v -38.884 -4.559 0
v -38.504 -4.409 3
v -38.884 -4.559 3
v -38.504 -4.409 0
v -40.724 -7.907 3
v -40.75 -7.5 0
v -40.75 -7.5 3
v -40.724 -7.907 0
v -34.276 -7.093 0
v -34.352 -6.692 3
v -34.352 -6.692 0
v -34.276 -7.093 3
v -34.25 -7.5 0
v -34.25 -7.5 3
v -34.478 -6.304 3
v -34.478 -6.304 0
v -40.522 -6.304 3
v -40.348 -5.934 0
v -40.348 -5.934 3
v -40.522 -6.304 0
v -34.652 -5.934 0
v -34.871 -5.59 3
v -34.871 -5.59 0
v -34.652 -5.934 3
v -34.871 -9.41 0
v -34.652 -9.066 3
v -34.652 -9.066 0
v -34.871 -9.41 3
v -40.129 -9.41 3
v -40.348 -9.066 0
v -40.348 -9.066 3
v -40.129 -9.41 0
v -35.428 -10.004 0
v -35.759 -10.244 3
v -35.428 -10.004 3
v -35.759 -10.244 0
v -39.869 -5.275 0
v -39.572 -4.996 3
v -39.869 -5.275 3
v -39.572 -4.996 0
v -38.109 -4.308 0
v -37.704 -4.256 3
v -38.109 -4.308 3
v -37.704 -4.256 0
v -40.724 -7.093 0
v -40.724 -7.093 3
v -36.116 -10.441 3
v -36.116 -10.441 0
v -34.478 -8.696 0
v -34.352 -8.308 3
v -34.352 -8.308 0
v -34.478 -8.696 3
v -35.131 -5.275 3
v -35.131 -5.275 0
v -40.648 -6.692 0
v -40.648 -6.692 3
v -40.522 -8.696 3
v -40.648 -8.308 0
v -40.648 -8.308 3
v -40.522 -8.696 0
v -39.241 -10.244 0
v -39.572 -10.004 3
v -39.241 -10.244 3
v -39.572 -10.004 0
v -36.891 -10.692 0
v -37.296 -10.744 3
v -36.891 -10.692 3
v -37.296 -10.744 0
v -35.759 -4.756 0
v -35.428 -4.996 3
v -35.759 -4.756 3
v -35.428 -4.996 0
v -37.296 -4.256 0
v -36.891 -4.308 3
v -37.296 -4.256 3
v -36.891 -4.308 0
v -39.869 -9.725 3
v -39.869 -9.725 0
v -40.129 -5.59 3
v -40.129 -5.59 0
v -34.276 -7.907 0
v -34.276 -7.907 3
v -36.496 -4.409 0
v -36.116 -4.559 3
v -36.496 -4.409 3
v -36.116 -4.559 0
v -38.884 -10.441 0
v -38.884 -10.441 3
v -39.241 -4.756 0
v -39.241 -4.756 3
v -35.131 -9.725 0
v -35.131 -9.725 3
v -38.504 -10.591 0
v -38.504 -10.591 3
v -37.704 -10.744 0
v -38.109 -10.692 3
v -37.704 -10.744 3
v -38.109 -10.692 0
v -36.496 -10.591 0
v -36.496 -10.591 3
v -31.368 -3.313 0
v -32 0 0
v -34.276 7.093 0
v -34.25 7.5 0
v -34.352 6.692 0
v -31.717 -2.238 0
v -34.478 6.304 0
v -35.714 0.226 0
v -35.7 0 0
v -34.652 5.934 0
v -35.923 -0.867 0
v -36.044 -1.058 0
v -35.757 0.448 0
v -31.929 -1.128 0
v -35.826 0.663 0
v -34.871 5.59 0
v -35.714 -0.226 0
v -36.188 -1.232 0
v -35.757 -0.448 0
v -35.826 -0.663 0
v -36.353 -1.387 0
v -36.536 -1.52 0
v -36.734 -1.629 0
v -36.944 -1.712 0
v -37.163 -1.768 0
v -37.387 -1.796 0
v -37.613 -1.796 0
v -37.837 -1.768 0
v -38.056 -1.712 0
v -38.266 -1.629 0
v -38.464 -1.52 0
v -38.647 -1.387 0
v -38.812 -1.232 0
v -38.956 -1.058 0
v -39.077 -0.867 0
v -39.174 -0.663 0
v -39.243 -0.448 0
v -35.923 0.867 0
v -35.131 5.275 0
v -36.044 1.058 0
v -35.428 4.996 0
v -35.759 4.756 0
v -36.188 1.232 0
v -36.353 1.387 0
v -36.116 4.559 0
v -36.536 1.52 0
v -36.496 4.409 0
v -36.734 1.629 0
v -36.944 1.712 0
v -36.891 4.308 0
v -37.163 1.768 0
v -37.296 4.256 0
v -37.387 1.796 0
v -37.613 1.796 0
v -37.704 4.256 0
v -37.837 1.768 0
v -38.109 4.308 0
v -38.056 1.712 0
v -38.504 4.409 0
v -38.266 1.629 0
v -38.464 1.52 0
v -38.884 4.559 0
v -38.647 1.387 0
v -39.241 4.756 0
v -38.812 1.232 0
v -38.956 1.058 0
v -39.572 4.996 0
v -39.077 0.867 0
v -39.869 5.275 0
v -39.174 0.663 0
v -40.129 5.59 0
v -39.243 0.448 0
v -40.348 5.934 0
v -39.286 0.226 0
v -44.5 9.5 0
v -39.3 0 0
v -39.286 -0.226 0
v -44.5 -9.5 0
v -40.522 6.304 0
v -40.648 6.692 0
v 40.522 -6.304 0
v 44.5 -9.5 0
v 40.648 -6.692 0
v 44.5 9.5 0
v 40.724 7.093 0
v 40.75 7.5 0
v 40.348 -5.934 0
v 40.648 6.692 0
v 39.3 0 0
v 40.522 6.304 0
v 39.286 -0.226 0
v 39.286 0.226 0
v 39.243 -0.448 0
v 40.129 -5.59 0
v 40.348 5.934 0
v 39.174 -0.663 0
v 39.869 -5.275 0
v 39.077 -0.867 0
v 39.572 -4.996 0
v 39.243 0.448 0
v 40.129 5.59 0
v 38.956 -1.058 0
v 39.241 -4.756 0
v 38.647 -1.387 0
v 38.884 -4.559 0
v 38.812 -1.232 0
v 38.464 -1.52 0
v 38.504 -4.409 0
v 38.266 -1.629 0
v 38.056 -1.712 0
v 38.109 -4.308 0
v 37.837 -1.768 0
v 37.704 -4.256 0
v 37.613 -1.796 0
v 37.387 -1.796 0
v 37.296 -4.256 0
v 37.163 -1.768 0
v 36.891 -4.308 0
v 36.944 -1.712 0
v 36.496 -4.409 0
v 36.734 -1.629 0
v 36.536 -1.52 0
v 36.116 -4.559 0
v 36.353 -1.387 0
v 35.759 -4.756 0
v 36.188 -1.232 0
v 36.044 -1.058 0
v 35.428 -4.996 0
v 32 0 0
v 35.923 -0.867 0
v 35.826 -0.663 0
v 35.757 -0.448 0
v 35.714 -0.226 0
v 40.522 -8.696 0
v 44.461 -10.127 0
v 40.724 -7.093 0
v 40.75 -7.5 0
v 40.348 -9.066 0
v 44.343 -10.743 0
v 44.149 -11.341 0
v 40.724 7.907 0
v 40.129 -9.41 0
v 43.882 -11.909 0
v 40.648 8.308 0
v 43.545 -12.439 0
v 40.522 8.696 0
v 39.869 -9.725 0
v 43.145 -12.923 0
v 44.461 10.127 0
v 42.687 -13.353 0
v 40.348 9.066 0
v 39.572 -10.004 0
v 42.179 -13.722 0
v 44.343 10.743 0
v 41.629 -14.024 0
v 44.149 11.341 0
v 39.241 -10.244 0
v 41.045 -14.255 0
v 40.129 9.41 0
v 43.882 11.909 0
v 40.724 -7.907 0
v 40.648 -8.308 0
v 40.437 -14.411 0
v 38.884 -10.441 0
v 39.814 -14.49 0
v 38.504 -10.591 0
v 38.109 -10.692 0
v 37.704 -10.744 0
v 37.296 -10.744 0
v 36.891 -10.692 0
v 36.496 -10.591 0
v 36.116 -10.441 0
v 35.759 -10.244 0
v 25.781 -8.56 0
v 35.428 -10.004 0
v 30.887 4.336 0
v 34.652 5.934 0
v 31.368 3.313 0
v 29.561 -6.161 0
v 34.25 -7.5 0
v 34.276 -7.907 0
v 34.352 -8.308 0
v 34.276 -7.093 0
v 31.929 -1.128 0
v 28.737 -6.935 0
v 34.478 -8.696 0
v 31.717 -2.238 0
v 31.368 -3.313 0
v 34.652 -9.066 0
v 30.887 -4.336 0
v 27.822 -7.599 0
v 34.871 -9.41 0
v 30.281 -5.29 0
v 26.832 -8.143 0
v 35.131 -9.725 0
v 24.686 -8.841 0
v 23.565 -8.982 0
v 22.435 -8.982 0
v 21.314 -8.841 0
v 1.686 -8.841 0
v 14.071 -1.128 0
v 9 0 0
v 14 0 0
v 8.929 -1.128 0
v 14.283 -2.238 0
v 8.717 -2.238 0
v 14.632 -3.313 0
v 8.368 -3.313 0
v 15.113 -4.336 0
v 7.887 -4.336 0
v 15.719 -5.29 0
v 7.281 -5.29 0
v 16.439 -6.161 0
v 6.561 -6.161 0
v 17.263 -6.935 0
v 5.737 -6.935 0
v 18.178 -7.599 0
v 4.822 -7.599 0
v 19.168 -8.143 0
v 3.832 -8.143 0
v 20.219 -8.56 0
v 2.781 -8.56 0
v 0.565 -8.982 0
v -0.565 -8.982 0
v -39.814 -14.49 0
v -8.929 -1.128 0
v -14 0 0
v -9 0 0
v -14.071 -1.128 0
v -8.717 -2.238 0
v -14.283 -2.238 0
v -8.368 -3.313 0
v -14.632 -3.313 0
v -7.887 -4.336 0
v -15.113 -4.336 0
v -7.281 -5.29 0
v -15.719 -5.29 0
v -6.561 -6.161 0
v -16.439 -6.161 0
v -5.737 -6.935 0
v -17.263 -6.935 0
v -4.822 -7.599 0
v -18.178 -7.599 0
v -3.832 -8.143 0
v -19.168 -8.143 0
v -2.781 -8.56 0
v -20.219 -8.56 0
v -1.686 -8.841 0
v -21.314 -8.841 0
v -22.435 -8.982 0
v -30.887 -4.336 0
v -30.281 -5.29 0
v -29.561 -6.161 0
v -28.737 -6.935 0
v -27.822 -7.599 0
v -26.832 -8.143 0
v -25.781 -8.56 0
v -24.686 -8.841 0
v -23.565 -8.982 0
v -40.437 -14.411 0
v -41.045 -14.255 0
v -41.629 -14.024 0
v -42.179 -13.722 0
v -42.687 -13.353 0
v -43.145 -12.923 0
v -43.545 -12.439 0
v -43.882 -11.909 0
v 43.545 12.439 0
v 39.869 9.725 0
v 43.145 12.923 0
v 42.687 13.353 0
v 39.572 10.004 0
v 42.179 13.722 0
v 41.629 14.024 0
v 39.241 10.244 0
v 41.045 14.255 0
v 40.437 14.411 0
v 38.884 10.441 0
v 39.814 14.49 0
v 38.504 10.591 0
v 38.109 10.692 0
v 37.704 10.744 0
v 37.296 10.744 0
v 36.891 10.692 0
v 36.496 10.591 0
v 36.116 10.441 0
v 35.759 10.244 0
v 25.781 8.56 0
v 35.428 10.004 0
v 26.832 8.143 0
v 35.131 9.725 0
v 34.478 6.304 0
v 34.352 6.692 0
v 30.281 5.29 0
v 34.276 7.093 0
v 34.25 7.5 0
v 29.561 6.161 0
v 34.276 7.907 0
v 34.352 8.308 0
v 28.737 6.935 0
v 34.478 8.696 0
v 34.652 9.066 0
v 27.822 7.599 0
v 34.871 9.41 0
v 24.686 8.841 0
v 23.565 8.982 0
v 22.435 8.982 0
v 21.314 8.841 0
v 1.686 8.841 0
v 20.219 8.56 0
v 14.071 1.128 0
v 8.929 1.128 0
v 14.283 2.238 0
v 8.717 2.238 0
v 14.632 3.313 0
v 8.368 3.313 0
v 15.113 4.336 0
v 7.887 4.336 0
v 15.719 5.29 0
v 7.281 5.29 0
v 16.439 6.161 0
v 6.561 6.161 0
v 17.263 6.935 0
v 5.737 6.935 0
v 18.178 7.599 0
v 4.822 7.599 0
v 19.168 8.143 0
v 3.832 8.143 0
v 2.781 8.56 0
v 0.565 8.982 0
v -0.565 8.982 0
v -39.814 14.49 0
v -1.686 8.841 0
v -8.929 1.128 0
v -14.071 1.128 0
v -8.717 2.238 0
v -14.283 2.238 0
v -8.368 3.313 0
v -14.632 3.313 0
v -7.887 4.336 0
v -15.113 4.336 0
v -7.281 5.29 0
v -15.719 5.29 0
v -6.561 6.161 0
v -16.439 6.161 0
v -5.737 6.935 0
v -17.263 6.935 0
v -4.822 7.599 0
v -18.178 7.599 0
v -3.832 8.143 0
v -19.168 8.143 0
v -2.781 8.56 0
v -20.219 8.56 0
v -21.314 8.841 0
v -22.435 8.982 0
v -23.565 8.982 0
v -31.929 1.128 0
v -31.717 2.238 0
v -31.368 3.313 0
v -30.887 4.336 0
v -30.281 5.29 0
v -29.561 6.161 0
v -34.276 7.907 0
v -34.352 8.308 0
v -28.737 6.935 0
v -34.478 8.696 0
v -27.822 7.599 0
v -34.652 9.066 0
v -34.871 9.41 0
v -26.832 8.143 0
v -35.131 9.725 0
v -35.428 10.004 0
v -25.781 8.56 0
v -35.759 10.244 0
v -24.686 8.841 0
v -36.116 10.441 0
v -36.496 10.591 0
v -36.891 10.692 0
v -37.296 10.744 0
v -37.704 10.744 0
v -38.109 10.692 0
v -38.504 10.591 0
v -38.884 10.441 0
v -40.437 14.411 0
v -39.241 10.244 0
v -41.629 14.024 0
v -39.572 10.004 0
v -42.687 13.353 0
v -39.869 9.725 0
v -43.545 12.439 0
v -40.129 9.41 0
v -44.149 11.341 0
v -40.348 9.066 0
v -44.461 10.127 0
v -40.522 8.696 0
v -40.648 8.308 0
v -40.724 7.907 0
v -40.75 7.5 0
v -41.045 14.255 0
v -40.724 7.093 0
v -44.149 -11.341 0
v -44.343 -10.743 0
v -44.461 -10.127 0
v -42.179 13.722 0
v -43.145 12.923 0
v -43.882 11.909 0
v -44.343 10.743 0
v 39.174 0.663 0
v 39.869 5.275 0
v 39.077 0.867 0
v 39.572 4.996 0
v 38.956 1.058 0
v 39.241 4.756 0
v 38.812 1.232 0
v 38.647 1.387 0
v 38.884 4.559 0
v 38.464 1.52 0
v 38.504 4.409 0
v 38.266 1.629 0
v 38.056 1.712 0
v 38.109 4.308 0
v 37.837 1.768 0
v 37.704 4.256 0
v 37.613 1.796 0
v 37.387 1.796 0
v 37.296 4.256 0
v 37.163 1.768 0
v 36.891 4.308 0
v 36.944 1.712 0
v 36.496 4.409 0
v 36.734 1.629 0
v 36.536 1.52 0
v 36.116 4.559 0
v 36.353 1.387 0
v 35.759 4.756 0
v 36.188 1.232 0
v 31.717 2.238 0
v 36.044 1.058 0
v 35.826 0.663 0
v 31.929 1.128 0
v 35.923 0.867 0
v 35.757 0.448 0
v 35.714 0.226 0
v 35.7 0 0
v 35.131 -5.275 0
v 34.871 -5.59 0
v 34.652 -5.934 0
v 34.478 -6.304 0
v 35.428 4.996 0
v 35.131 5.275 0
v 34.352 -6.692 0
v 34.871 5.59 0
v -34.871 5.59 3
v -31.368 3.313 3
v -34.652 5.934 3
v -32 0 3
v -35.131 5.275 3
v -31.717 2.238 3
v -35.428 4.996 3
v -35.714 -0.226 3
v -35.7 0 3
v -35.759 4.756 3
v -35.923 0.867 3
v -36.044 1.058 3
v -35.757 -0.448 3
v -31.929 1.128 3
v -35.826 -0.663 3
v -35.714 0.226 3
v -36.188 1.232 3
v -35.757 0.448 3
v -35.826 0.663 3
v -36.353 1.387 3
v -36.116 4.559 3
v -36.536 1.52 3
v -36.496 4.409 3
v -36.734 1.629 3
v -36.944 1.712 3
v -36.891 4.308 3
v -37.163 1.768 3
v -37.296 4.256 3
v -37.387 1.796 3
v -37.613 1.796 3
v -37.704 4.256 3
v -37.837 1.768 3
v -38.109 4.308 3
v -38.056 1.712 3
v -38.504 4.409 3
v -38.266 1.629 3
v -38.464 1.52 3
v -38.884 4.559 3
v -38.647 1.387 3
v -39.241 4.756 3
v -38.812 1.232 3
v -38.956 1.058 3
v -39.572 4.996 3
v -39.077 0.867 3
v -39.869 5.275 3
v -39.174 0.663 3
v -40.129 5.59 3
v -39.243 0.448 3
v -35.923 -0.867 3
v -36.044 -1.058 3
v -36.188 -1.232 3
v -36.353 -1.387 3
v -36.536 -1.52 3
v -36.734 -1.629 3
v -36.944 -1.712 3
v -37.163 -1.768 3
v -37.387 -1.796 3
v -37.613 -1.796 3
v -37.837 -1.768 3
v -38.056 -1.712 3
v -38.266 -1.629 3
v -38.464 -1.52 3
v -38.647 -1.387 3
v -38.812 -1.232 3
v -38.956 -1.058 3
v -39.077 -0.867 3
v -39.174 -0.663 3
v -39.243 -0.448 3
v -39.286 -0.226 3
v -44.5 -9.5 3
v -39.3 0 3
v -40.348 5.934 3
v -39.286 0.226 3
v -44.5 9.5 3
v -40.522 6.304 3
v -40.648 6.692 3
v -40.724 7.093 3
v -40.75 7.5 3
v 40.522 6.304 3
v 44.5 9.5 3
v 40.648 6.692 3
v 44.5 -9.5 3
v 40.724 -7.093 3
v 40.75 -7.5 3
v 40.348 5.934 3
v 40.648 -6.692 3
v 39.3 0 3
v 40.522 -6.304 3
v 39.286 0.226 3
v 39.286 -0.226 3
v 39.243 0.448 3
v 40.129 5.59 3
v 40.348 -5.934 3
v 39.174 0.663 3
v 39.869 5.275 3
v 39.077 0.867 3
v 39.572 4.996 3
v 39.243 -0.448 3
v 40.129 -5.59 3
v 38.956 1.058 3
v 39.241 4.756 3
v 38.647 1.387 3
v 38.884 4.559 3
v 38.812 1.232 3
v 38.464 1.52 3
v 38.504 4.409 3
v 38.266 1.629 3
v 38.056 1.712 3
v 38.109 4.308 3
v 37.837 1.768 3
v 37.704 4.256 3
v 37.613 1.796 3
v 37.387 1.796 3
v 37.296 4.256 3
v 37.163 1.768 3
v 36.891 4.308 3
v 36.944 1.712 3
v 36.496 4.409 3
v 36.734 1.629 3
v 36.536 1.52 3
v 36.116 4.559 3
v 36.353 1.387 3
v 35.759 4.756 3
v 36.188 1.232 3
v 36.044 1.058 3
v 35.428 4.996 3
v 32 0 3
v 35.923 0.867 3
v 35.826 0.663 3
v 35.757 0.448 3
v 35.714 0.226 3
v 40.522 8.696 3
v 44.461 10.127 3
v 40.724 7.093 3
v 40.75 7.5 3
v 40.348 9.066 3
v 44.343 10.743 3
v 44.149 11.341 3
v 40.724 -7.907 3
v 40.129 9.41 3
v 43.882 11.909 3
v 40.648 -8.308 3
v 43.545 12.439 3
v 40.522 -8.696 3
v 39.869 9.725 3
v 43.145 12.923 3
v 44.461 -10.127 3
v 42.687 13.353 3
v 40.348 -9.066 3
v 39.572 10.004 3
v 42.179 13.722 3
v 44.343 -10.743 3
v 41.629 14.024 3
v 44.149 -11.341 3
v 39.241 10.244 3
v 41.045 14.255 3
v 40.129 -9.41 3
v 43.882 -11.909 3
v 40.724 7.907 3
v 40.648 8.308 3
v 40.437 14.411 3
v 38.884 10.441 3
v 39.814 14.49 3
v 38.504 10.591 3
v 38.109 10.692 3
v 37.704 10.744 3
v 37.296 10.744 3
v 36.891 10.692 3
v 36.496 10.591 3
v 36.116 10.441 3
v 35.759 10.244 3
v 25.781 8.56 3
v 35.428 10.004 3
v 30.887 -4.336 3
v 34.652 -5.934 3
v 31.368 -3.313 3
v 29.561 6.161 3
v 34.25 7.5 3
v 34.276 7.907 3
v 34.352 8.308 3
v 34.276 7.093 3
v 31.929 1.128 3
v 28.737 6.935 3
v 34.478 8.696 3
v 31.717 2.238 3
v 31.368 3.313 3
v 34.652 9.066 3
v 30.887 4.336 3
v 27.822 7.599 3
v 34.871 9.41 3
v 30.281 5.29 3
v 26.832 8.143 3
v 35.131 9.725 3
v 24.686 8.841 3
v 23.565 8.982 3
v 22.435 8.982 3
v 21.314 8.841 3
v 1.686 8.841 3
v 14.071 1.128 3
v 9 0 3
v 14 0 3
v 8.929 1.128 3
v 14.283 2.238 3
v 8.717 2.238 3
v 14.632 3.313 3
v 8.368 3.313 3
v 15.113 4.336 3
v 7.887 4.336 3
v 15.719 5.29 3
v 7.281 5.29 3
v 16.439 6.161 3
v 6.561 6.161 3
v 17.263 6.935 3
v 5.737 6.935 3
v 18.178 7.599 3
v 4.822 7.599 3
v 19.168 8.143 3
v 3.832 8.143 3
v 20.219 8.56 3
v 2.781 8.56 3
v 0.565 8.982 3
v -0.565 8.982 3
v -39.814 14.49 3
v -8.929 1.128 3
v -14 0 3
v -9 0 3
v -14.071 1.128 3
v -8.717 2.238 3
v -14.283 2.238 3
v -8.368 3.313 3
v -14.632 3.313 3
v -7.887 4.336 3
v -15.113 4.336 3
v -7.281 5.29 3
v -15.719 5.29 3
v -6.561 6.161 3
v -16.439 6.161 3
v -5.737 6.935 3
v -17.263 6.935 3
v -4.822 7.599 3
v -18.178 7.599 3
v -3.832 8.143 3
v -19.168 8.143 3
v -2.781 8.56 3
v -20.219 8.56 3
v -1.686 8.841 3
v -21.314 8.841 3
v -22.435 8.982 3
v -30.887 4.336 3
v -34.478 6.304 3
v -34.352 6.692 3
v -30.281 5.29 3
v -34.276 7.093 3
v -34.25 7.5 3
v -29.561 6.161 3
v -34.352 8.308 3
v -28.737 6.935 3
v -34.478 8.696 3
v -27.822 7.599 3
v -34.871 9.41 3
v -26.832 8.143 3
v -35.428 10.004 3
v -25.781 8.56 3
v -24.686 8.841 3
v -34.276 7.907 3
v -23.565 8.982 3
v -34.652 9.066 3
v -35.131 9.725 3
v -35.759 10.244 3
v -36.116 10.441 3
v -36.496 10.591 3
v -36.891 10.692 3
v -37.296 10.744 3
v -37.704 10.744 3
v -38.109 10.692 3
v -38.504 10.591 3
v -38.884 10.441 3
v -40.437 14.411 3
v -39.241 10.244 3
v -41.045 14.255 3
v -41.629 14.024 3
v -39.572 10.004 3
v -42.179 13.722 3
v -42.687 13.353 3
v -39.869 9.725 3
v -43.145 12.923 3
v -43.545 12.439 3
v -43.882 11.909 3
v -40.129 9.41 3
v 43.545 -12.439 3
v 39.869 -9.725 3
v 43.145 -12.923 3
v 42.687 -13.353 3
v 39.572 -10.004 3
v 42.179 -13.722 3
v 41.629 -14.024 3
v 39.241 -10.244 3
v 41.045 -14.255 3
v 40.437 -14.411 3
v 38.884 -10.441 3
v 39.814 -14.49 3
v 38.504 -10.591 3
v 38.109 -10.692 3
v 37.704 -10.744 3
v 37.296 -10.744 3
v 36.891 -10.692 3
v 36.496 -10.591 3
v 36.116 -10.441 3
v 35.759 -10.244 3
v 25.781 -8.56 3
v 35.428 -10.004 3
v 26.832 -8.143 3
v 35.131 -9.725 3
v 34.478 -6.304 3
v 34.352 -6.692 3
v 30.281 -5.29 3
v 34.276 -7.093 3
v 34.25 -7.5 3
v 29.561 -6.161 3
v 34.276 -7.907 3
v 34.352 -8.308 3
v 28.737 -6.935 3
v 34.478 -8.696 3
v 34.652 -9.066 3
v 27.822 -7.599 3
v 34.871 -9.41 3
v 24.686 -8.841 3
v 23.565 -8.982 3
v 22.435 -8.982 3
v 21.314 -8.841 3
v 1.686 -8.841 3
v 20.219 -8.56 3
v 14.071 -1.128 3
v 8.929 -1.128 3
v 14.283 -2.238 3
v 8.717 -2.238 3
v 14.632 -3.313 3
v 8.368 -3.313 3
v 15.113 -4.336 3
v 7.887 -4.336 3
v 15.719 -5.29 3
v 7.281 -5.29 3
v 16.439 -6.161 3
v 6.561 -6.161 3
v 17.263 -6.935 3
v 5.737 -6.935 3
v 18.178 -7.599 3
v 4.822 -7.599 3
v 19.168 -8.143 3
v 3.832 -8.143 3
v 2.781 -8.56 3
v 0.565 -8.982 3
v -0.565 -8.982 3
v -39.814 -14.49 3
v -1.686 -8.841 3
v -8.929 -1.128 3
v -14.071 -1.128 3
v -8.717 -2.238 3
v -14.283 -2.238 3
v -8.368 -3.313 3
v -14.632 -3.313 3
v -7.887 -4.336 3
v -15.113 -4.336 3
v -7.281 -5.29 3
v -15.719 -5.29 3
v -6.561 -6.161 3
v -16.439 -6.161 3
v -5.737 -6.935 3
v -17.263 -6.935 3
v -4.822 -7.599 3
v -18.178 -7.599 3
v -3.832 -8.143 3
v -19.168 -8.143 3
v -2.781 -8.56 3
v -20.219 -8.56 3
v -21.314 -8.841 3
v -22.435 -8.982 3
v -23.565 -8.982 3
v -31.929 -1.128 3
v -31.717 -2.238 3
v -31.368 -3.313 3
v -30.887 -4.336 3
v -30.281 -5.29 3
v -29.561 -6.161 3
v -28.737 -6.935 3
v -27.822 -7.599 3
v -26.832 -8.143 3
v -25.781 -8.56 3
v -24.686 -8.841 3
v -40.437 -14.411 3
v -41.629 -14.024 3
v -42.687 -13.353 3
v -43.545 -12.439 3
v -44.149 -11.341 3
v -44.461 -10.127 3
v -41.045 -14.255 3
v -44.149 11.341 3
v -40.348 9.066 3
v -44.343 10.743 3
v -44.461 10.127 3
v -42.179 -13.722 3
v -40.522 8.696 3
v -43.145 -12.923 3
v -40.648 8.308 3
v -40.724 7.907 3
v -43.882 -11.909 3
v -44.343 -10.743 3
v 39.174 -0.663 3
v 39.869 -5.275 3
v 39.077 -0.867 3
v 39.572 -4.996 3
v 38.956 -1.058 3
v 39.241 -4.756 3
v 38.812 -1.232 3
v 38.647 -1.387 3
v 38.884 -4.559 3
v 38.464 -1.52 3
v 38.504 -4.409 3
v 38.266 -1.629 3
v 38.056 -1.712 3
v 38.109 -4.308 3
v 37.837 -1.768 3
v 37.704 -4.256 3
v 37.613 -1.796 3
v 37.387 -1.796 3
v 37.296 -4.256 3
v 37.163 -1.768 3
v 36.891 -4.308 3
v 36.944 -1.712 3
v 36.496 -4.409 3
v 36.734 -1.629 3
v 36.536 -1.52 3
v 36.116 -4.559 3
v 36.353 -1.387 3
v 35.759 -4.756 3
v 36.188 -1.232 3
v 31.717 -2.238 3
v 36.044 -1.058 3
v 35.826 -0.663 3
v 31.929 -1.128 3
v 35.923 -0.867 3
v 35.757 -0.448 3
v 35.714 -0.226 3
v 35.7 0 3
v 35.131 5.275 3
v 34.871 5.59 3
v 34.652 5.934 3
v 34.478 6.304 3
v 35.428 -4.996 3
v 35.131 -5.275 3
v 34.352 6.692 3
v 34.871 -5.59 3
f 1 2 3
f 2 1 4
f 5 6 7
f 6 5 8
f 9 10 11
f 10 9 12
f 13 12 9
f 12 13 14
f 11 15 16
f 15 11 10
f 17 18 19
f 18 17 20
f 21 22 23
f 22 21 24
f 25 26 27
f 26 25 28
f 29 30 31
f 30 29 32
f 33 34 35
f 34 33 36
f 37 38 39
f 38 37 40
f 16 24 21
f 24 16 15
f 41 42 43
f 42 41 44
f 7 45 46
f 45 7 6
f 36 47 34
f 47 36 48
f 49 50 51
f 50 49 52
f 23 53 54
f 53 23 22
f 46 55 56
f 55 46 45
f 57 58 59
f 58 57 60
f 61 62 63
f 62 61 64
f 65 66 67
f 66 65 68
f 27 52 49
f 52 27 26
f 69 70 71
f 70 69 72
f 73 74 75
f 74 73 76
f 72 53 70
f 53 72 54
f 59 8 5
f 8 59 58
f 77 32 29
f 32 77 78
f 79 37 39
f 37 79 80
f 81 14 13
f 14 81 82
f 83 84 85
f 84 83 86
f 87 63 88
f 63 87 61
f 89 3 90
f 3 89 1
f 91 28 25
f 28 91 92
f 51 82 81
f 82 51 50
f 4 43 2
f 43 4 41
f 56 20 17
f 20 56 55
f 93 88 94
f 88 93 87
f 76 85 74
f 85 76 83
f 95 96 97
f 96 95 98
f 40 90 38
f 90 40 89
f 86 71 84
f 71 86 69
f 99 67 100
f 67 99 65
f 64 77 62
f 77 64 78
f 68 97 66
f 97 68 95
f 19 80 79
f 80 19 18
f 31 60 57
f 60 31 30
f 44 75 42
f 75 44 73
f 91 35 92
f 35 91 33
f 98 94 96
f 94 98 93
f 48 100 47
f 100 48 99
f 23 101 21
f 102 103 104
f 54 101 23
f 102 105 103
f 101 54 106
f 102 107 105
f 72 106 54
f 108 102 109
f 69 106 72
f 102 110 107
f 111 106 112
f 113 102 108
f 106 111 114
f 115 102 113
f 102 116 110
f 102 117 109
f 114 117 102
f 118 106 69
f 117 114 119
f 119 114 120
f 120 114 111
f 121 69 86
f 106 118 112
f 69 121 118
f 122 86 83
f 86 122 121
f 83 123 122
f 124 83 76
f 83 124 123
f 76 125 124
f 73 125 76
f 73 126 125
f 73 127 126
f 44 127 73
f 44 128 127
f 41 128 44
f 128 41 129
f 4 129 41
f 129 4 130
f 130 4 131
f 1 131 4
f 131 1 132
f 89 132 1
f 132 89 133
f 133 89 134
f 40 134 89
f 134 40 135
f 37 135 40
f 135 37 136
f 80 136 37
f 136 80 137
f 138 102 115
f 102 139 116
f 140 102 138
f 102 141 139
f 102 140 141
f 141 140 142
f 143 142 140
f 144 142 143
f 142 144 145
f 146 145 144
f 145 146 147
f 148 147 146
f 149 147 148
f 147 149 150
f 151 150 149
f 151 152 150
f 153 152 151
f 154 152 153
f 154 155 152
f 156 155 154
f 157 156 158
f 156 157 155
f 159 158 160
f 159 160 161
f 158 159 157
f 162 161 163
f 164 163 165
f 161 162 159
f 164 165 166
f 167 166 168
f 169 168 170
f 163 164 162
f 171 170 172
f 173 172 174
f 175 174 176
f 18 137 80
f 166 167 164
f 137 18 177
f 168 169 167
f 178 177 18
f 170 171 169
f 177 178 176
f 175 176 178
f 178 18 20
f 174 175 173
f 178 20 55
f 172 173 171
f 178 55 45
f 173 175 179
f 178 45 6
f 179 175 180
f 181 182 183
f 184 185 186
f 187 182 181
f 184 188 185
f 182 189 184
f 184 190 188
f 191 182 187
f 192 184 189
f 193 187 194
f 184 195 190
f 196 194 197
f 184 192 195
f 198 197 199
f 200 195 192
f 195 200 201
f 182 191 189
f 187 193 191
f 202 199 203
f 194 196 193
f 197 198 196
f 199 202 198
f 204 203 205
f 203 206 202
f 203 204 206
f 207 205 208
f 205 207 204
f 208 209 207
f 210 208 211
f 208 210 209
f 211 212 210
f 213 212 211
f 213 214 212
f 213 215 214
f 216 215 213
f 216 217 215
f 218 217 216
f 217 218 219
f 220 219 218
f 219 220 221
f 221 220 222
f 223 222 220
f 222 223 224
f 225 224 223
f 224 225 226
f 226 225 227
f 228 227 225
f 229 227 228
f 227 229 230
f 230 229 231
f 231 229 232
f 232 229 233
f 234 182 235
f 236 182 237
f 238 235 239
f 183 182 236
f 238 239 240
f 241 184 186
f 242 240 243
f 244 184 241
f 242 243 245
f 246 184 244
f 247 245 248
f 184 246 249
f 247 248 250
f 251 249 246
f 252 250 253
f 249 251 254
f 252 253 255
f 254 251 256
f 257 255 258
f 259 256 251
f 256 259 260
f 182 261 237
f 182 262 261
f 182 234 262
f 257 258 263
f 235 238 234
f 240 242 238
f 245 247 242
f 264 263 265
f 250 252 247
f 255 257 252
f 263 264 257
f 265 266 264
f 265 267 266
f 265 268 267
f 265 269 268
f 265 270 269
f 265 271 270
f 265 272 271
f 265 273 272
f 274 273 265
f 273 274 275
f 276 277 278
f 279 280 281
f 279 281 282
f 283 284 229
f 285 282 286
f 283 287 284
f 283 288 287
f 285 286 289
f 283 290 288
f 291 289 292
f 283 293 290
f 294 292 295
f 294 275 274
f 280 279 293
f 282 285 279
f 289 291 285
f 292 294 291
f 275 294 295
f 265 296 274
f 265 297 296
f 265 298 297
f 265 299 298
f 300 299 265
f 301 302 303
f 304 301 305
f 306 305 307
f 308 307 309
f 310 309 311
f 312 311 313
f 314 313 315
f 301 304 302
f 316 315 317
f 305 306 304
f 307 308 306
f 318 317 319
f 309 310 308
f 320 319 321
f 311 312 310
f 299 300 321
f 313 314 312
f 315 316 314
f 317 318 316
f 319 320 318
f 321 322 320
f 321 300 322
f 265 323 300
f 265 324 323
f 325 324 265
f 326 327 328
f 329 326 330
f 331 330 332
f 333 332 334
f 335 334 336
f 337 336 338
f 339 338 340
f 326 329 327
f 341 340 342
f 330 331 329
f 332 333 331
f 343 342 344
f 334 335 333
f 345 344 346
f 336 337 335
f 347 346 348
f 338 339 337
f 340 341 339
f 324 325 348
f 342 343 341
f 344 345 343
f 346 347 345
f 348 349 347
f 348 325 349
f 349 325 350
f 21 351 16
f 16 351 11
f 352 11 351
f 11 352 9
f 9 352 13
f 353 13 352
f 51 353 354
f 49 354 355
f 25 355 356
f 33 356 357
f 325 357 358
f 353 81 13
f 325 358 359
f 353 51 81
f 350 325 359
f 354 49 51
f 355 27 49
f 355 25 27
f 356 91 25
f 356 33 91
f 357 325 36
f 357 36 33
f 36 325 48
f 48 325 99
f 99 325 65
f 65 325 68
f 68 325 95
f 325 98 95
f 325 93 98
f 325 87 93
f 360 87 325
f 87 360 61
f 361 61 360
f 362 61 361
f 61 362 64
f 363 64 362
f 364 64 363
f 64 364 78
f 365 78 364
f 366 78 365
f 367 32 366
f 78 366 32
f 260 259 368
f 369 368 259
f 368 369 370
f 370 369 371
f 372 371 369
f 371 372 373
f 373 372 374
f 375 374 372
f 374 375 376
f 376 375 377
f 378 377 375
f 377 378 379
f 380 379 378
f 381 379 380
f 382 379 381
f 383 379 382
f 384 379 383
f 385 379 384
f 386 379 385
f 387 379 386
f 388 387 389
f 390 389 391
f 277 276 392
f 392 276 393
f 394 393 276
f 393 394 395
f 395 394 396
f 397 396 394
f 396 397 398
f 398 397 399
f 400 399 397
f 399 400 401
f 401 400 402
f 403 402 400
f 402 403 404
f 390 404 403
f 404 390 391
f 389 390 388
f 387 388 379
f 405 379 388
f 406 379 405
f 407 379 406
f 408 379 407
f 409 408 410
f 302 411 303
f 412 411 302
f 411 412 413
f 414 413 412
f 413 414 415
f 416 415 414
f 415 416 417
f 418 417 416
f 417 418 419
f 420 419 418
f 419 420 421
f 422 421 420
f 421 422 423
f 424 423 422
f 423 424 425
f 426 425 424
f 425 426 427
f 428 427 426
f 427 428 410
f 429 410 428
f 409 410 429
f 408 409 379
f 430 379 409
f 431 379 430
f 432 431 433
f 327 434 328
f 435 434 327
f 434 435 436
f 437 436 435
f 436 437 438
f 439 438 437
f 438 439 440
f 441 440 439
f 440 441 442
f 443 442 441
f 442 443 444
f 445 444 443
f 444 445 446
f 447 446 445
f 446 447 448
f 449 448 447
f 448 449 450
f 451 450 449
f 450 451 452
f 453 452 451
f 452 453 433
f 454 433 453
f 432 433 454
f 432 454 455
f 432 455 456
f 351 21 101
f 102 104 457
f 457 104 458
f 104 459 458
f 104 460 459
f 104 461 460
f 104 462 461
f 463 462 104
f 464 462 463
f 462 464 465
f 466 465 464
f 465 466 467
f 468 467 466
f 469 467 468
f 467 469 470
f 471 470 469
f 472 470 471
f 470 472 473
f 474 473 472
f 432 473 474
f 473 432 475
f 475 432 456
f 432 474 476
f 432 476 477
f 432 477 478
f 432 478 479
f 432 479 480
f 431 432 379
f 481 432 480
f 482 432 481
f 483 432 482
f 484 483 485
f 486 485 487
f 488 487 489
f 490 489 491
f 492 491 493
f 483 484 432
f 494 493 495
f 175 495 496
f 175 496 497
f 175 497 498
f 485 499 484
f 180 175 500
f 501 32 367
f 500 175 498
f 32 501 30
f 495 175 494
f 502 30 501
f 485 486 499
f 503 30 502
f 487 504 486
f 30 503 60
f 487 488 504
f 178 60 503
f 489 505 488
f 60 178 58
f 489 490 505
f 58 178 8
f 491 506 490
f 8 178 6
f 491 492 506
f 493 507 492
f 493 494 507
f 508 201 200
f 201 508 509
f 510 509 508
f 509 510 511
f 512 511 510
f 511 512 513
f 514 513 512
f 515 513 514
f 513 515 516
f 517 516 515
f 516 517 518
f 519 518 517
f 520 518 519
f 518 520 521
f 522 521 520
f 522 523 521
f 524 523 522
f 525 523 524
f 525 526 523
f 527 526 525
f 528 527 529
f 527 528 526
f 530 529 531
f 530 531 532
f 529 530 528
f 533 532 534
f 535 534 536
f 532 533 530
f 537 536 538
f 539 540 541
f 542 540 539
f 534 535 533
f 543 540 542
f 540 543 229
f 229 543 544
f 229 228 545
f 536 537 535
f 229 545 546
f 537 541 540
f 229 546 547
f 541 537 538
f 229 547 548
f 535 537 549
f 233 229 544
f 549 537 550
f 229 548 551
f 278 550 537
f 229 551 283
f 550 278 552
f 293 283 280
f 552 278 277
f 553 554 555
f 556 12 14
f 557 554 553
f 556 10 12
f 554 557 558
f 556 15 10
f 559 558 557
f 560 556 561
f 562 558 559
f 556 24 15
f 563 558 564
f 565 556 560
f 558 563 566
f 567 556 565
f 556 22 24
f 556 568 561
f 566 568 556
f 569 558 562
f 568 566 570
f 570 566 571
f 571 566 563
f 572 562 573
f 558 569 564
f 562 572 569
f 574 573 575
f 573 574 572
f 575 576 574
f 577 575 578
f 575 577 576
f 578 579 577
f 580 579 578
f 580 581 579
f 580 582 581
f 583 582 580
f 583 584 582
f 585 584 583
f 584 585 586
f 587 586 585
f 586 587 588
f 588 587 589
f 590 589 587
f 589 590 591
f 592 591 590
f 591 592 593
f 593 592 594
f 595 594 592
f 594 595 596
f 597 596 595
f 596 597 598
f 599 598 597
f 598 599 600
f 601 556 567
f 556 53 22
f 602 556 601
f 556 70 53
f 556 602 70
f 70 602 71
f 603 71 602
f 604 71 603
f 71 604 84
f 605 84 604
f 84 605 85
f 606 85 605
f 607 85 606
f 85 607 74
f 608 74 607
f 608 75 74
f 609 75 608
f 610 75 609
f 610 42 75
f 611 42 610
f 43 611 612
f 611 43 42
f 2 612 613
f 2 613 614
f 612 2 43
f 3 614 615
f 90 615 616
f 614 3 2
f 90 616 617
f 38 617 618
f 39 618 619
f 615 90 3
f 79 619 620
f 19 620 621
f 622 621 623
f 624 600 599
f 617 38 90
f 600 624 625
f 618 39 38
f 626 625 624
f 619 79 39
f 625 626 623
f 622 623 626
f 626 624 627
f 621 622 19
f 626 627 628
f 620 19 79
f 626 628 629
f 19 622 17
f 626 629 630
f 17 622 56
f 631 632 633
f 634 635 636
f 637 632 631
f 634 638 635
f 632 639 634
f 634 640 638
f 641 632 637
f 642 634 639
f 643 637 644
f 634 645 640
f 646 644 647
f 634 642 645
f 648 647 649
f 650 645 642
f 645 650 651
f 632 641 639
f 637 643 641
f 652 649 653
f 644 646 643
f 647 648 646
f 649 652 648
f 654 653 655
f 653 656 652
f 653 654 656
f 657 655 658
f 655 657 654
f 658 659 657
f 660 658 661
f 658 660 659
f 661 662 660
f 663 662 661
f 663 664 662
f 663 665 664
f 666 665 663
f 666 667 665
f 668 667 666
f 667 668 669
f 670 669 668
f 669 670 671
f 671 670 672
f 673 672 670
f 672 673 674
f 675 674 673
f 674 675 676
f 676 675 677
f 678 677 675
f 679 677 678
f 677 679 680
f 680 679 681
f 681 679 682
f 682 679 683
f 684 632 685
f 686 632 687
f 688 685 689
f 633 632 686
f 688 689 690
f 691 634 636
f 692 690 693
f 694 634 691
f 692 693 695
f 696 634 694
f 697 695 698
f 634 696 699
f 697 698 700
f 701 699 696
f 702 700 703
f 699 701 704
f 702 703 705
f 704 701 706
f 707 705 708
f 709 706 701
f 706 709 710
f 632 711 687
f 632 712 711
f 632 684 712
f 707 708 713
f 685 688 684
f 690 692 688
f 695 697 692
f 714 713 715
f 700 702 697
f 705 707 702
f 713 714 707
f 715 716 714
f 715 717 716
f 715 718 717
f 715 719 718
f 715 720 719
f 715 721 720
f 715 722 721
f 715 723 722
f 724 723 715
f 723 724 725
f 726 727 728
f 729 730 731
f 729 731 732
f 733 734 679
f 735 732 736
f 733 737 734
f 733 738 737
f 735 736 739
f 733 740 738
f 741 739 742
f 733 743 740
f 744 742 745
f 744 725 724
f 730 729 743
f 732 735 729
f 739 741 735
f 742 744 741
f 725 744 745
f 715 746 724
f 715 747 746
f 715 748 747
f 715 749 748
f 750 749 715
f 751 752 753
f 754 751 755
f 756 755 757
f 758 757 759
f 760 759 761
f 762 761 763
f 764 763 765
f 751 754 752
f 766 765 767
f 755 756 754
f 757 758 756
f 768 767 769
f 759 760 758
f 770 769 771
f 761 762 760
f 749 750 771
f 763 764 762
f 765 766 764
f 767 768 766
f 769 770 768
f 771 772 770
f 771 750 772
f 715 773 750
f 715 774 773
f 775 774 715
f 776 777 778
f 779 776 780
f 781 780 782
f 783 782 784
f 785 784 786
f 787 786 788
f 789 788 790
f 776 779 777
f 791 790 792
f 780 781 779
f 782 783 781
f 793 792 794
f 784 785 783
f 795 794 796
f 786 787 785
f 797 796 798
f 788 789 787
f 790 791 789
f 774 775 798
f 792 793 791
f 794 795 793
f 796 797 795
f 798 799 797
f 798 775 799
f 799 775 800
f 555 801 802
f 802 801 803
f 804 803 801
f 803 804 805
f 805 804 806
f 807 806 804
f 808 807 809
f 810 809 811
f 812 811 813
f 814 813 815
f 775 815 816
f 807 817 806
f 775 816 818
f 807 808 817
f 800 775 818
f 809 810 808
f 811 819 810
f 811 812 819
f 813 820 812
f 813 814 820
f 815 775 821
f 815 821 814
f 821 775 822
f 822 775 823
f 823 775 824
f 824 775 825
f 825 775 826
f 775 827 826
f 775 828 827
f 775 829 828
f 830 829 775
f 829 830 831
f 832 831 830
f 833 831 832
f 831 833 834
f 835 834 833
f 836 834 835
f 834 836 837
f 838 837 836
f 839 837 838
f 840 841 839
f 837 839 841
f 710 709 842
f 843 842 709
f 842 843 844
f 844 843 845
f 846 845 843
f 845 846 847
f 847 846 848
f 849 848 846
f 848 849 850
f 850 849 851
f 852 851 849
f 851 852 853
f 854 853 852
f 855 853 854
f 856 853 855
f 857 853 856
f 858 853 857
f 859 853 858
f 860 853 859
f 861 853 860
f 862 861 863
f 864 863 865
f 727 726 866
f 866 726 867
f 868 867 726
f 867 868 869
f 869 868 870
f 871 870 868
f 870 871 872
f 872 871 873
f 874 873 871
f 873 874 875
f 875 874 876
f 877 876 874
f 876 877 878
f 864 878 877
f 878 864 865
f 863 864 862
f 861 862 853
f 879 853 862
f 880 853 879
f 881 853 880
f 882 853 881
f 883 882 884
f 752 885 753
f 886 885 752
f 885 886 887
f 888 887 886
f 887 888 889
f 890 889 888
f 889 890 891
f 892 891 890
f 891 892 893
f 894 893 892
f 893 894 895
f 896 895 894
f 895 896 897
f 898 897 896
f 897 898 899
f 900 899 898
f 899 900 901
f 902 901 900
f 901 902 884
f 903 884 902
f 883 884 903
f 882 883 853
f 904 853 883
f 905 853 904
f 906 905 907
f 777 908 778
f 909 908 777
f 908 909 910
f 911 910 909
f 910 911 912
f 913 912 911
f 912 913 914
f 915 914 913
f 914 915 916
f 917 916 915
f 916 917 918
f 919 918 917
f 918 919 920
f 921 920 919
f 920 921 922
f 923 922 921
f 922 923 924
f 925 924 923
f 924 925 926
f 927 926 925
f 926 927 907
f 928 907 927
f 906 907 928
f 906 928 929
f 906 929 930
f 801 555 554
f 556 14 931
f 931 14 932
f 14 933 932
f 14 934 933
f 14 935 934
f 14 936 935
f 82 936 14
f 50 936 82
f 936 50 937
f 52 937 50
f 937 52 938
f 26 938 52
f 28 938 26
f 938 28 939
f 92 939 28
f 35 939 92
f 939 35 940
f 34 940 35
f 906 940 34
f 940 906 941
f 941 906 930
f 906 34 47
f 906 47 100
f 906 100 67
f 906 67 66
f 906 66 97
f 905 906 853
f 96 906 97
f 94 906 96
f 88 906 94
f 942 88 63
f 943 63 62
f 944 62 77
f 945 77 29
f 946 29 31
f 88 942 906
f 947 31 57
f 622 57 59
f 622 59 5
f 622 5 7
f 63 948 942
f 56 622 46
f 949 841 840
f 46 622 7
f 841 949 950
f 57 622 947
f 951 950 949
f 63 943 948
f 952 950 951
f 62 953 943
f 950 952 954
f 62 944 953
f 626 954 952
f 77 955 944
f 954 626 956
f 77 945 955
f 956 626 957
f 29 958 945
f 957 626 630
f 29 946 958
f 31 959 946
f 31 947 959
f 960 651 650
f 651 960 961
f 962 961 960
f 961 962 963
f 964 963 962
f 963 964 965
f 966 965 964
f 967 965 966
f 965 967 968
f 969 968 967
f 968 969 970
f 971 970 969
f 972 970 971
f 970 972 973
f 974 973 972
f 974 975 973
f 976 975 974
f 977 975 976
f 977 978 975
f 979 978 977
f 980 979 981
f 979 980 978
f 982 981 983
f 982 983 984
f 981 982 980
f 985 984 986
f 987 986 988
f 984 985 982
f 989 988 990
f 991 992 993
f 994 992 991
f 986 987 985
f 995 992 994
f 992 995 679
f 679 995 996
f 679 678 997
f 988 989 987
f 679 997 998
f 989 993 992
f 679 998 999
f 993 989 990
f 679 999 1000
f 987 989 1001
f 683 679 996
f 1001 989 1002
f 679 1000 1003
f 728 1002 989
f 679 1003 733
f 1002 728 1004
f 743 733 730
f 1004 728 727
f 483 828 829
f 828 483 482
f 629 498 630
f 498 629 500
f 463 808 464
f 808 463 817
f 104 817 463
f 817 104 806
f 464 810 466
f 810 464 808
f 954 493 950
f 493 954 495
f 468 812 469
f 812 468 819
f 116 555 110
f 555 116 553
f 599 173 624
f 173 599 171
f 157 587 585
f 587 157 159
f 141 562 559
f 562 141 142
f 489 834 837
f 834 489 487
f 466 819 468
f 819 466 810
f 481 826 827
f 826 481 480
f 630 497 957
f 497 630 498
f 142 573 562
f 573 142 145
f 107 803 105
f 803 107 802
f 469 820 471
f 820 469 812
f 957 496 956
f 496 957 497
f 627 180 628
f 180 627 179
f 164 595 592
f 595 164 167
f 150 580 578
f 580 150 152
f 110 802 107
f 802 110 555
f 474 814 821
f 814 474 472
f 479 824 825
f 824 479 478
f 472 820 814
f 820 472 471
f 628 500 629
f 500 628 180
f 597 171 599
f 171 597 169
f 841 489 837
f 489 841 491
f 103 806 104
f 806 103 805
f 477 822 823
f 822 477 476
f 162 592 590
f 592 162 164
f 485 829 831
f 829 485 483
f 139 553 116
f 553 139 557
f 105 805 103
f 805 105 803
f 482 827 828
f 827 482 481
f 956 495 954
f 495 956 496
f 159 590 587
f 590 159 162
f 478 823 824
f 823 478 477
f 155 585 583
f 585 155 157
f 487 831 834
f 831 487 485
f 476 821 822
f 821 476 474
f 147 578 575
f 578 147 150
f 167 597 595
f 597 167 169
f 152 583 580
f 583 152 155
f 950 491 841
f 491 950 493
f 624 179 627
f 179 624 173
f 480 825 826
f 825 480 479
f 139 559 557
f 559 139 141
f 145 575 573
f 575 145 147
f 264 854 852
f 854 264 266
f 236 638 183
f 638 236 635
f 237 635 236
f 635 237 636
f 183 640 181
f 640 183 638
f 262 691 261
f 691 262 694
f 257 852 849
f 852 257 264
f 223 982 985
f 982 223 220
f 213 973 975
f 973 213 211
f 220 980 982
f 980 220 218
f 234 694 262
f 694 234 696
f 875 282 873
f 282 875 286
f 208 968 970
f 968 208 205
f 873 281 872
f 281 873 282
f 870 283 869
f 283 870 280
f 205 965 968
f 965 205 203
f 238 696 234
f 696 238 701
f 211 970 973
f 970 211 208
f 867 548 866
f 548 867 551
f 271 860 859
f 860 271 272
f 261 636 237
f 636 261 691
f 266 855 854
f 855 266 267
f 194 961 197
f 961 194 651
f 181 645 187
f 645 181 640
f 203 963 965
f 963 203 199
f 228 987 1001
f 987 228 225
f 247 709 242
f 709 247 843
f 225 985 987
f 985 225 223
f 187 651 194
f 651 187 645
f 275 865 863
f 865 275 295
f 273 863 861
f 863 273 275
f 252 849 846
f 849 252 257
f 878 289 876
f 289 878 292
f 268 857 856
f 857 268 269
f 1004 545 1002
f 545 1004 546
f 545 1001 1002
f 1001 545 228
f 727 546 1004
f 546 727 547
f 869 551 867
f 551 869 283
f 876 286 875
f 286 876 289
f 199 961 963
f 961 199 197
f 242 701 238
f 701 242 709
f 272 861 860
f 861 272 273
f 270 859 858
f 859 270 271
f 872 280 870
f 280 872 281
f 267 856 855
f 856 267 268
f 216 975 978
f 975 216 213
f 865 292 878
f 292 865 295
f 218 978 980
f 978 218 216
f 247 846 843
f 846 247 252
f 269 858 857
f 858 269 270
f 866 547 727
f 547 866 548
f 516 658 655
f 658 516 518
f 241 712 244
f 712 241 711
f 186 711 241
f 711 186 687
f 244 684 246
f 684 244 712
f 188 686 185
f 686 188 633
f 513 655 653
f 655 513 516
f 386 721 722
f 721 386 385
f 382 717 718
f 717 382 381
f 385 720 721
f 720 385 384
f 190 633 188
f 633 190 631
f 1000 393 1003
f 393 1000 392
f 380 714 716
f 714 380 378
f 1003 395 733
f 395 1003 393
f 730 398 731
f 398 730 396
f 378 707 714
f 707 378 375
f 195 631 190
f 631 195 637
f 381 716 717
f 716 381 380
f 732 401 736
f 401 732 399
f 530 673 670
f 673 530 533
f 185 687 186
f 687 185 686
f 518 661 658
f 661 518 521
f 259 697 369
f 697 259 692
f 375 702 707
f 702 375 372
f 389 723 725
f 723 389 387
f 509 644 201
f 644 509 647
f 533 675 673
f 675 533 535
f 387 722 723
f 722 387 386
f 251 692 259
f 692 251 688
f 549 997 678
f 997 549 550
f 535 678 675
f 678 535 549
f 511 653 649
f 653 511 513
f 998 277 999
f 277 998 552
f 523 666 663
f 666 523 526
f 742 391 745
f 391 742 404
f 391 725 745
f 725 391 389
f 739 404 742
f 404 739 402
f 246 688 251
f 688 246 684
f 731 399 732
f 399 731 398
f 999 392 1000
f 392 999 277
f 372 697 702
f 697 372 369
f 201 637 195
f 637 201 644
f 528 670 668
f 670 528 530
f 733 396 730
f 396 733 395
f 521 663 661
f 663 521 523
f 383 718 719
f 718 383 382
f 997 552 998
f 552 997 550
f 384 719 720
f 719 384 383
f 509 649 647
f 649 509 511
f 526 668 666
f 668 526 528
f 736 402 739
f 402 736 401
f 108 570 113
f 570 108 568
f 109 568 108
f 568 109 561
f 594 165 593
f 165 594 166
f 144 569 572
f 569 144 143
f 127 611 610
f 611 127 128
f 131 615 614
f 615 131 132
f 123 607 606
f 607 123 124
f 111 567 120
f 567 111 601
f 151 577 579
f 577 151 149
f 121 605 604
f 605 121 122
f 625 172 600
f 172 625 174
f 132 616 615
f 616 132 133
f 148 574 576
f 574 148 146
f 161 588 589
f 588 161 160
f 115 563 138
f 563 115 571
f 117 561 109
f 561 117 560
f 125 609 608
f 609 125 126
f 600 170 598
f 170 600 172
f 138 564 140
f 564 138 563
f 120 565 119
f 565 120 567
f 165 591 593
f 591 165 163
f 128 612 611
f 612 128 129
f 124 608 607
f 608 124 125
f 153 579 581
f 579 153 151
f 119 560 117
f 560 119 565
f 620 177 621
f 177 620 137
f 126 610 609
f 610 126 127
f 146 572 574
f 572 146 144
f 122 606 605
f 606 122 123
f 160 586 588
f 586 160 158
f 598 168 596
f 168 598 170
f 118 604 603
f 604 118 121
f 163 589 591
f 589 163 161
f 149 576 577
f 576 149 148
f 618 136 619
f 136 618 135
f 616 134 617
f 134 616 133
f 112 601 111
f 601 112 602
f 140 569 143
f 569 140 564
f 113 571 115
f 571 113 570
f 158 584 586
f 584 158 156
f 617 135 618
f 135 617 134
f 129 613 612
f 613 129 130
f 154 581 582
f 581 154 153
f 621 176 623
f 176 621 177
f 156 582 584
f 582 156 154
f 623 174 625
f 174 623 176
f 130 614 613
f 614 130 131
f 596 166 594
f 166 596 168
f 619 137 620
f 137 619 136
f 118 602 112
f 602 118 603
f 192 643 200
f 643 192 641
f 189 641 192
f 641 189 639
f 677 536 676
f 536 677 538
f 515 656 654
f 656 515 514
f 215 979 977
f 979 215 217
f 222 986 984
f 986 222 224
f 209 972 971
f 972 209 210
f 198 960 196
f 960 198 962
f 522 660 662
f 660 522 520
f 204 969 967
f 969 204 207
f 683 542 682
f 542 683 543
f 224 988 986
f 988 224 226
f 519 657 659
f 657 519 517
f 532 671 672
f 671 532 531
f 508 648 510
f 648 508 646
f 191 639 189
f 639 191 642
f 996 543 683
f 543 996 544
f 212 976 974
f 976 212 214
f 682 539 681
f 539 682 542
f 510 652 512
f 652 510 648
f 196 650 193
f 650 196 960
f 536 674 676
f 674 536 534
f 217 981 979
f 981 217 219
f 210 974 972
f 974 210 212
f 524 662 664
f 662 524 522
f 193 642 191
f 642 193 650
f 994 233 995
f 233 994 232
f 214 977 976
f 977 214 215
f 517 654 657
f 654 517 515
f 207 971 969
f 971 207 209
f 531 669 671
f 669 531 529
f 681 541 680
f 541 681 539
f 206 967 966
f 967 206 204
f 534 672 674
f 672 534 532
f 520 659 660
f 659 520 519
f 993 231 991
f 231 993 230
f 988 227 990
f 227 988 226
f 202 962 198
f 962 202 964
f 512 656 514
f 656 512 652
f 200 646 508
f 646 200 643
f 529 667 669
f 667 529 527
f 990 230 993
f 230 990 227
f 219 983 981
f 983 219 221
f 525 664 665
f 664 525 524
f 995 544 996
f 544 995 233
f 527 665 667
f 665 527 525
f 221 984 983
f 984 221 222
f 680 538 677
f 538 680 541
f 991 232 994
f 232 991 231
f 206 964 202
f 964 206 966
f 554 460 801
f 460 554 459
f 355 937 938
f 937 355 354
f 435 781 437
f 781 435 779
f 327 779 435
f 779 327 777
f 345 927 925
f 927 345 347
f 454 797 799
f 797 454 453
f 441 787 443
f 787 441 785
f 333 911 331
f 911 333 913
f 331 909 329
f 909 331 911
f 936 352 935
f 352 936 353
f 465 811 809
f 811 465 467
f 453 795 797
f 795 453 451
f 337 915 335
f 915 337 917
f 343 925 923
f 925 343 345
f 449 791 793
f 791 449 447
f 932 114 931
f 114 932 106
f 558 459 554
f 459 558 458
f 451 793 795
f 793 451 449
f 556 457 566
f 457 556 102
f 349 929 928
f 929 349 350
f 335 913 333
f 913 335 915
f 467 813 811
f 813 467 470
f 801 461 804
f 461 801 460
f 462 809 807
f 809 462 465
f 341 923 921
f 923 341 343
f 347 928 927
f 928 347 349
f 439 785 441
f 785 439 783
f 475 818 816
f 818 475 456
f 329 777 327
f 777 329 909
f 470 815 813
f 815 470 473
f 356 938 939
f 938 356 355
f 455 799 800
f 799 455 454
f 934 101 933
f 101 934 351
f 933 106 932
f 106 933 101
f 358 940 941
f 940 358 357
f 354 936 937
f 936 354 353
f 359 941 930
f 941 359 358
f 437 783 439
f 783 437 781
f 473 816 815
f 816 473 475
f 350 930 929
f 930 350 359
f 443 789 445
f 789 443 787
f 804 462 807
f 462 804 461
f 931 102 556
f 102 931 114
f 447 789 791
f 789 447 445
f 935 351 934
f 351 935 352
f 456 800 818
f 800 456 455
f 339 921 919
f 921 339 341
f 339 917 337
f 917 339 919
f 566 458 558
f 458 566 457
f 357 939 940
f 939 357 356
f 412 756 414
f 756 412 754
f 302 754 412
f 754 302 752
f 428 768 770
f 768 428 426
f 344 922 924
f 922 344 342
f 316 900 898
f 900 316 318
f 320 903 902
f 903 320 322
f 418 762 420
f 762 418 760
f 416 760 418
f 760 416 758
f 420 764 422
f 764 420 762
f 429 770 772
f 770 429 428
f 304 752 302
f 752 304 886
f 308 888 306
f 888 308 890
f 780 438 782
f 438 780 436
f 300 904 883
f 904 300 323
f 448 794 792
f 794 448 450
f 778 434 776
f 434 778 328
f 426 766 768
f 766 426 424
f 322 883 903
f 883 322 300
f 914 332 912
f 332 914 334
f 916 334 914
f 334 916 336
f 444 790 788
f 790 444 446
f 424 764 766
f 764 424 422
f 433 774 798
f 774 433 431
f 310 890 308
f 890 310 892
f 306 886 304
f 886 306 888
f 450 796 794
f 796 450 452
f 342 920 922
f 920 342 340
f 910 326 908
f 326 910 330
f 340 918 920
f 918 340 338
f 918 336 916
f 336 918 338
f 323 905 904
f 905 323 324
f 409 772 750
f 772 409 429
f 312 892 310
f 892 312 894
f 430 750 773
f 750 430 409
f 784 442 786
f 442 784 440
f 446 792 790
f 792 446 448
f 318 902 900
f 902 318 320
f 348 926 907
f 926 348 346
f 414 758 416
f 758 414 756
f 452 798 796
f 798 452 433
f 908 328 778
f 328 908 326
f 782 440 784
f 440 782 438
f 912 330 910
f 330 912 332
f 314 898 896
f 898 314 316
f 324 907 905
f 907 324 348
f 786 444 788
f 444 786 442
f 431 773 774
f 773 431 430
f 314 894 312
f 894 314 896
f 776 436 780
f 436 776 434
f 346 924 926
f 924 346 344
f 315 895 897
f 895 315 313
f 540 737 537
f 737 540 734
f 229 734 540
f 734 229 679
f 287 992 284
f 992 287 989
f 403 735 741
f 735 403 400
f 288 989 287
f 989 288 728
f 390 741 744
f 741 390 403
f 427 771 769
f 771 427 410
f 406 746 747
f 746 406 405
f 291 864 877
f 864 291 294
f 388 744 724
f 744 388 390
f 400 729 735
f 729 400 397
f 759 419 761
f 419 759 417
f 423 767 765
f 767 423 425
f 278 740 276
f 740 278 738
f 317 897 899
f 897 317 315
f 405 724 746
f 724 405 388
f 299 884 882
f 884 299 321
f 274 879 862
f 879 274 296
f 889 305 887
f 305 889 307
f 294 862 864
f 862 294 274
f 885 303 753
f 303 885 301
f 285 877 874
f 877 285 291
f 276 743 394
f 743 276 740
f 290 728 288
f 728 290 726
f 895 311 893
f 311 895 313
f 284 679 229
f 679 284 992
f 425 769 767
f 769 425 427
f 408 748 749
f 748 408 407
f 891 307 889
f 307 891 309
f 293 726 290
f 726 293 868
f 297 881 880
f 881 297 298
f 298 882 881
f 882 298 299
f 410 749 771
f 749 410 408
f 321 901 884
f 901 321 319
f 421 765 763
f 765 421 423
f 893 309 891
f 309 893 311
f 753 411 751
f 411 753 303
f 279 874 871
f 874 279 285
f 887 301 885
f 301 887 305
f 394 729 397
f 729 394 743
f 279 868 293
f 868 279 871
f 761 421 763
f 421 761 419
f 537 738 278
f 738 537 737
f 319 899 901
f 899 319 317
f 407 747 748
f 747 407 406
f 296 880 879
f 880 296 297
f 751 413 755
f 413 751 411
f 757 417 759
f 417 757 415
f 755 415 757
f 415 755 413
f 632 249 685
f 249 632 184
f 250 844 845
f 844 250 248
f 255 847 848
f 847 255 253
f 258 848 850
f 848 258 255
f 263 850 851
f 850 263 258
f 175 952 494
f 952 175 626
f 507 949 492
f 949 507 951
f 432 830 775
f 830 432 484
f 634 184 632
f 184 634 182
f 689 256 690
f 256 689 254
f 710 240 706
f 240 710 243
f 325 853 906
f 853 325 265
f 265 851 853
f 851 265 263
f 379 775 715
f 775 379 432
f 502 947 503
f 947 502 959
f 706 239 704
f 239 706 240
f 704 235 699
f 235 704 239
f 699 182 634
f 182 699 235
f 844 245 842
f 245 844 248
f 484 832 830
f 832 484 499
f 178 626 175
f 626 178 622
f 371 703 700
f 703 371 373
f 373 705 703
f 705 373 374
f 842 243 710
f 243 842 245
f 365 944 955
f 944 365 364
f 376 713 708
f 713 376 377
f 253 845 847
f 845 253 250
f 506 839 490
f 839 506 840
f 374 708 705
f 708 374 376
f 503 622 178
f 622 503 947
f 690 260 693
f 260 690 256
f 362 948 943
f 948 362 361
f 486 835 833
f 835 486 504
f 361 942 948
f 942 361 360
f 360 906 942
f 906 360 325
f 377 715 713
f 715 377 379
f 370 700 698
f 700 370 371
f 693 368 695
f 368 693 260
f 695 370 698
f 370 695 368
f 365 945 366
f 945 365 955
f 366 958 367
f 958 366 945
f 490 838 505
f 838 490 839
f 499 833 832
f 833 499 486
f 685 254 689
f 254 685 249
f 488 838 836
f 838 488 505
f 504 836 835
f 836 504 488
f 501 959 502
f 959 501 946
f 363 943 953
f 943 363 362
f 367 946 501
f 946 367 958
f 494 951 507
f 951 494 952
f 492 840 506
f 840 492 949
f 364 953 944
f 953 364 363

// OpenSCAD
$fn = 50;

difference() {
	union() {
		hull() {
			translate(v = [-39.5, 9.5, 0]) {
				cylinder(h = 3, r = 5);
			}
			translate(v = [39.5, 9.5, 0]) {
				cylinder(h = 3, r = 5);
			}
			translate(v = [-39.5, -9.5, 0]) {
				cylinder(h = 3, r = 5);
			}
			translate(v = [39.5, -9.5, 0]) {
				cylinder(h = 3, r = 5);
			}
		}
	}
	union() {
		translate(v = [-37.5, -7.5, 0]) {
			cylinder(h = 3, r = 3.25);
		}
		translate(v = [-37.5, 7.5, 0]) {
			cylinder(h = 3, r = 3.25);
		}
		translate(v = [37.5, -7.5, 0]) {
			cylinder(h = 3, r = 3.25);
		}
		translate(v = [37.5, 7.5, 0]) {
			cylinder(h = 3, r = 3.25);
		}
		translate(v = [-37.5, 0.0, 0]) {
			cylinder(h = 3, r = 1.8);
		}
		translate(v = [37.5, 0.0, 0]) {
			cylinder(h = 3, r = 1.8);
		}
		translate(v = [-23.0, 0, 0.0]) {
			cylinder(h = 3, r = 9.0);
		}
		cylinder(h = 3, r = 9.0);
		translate(v = [23.0, 0, 0.0]) {
			cylinder(h = 3, r = 9.0);
		}
	}
}
